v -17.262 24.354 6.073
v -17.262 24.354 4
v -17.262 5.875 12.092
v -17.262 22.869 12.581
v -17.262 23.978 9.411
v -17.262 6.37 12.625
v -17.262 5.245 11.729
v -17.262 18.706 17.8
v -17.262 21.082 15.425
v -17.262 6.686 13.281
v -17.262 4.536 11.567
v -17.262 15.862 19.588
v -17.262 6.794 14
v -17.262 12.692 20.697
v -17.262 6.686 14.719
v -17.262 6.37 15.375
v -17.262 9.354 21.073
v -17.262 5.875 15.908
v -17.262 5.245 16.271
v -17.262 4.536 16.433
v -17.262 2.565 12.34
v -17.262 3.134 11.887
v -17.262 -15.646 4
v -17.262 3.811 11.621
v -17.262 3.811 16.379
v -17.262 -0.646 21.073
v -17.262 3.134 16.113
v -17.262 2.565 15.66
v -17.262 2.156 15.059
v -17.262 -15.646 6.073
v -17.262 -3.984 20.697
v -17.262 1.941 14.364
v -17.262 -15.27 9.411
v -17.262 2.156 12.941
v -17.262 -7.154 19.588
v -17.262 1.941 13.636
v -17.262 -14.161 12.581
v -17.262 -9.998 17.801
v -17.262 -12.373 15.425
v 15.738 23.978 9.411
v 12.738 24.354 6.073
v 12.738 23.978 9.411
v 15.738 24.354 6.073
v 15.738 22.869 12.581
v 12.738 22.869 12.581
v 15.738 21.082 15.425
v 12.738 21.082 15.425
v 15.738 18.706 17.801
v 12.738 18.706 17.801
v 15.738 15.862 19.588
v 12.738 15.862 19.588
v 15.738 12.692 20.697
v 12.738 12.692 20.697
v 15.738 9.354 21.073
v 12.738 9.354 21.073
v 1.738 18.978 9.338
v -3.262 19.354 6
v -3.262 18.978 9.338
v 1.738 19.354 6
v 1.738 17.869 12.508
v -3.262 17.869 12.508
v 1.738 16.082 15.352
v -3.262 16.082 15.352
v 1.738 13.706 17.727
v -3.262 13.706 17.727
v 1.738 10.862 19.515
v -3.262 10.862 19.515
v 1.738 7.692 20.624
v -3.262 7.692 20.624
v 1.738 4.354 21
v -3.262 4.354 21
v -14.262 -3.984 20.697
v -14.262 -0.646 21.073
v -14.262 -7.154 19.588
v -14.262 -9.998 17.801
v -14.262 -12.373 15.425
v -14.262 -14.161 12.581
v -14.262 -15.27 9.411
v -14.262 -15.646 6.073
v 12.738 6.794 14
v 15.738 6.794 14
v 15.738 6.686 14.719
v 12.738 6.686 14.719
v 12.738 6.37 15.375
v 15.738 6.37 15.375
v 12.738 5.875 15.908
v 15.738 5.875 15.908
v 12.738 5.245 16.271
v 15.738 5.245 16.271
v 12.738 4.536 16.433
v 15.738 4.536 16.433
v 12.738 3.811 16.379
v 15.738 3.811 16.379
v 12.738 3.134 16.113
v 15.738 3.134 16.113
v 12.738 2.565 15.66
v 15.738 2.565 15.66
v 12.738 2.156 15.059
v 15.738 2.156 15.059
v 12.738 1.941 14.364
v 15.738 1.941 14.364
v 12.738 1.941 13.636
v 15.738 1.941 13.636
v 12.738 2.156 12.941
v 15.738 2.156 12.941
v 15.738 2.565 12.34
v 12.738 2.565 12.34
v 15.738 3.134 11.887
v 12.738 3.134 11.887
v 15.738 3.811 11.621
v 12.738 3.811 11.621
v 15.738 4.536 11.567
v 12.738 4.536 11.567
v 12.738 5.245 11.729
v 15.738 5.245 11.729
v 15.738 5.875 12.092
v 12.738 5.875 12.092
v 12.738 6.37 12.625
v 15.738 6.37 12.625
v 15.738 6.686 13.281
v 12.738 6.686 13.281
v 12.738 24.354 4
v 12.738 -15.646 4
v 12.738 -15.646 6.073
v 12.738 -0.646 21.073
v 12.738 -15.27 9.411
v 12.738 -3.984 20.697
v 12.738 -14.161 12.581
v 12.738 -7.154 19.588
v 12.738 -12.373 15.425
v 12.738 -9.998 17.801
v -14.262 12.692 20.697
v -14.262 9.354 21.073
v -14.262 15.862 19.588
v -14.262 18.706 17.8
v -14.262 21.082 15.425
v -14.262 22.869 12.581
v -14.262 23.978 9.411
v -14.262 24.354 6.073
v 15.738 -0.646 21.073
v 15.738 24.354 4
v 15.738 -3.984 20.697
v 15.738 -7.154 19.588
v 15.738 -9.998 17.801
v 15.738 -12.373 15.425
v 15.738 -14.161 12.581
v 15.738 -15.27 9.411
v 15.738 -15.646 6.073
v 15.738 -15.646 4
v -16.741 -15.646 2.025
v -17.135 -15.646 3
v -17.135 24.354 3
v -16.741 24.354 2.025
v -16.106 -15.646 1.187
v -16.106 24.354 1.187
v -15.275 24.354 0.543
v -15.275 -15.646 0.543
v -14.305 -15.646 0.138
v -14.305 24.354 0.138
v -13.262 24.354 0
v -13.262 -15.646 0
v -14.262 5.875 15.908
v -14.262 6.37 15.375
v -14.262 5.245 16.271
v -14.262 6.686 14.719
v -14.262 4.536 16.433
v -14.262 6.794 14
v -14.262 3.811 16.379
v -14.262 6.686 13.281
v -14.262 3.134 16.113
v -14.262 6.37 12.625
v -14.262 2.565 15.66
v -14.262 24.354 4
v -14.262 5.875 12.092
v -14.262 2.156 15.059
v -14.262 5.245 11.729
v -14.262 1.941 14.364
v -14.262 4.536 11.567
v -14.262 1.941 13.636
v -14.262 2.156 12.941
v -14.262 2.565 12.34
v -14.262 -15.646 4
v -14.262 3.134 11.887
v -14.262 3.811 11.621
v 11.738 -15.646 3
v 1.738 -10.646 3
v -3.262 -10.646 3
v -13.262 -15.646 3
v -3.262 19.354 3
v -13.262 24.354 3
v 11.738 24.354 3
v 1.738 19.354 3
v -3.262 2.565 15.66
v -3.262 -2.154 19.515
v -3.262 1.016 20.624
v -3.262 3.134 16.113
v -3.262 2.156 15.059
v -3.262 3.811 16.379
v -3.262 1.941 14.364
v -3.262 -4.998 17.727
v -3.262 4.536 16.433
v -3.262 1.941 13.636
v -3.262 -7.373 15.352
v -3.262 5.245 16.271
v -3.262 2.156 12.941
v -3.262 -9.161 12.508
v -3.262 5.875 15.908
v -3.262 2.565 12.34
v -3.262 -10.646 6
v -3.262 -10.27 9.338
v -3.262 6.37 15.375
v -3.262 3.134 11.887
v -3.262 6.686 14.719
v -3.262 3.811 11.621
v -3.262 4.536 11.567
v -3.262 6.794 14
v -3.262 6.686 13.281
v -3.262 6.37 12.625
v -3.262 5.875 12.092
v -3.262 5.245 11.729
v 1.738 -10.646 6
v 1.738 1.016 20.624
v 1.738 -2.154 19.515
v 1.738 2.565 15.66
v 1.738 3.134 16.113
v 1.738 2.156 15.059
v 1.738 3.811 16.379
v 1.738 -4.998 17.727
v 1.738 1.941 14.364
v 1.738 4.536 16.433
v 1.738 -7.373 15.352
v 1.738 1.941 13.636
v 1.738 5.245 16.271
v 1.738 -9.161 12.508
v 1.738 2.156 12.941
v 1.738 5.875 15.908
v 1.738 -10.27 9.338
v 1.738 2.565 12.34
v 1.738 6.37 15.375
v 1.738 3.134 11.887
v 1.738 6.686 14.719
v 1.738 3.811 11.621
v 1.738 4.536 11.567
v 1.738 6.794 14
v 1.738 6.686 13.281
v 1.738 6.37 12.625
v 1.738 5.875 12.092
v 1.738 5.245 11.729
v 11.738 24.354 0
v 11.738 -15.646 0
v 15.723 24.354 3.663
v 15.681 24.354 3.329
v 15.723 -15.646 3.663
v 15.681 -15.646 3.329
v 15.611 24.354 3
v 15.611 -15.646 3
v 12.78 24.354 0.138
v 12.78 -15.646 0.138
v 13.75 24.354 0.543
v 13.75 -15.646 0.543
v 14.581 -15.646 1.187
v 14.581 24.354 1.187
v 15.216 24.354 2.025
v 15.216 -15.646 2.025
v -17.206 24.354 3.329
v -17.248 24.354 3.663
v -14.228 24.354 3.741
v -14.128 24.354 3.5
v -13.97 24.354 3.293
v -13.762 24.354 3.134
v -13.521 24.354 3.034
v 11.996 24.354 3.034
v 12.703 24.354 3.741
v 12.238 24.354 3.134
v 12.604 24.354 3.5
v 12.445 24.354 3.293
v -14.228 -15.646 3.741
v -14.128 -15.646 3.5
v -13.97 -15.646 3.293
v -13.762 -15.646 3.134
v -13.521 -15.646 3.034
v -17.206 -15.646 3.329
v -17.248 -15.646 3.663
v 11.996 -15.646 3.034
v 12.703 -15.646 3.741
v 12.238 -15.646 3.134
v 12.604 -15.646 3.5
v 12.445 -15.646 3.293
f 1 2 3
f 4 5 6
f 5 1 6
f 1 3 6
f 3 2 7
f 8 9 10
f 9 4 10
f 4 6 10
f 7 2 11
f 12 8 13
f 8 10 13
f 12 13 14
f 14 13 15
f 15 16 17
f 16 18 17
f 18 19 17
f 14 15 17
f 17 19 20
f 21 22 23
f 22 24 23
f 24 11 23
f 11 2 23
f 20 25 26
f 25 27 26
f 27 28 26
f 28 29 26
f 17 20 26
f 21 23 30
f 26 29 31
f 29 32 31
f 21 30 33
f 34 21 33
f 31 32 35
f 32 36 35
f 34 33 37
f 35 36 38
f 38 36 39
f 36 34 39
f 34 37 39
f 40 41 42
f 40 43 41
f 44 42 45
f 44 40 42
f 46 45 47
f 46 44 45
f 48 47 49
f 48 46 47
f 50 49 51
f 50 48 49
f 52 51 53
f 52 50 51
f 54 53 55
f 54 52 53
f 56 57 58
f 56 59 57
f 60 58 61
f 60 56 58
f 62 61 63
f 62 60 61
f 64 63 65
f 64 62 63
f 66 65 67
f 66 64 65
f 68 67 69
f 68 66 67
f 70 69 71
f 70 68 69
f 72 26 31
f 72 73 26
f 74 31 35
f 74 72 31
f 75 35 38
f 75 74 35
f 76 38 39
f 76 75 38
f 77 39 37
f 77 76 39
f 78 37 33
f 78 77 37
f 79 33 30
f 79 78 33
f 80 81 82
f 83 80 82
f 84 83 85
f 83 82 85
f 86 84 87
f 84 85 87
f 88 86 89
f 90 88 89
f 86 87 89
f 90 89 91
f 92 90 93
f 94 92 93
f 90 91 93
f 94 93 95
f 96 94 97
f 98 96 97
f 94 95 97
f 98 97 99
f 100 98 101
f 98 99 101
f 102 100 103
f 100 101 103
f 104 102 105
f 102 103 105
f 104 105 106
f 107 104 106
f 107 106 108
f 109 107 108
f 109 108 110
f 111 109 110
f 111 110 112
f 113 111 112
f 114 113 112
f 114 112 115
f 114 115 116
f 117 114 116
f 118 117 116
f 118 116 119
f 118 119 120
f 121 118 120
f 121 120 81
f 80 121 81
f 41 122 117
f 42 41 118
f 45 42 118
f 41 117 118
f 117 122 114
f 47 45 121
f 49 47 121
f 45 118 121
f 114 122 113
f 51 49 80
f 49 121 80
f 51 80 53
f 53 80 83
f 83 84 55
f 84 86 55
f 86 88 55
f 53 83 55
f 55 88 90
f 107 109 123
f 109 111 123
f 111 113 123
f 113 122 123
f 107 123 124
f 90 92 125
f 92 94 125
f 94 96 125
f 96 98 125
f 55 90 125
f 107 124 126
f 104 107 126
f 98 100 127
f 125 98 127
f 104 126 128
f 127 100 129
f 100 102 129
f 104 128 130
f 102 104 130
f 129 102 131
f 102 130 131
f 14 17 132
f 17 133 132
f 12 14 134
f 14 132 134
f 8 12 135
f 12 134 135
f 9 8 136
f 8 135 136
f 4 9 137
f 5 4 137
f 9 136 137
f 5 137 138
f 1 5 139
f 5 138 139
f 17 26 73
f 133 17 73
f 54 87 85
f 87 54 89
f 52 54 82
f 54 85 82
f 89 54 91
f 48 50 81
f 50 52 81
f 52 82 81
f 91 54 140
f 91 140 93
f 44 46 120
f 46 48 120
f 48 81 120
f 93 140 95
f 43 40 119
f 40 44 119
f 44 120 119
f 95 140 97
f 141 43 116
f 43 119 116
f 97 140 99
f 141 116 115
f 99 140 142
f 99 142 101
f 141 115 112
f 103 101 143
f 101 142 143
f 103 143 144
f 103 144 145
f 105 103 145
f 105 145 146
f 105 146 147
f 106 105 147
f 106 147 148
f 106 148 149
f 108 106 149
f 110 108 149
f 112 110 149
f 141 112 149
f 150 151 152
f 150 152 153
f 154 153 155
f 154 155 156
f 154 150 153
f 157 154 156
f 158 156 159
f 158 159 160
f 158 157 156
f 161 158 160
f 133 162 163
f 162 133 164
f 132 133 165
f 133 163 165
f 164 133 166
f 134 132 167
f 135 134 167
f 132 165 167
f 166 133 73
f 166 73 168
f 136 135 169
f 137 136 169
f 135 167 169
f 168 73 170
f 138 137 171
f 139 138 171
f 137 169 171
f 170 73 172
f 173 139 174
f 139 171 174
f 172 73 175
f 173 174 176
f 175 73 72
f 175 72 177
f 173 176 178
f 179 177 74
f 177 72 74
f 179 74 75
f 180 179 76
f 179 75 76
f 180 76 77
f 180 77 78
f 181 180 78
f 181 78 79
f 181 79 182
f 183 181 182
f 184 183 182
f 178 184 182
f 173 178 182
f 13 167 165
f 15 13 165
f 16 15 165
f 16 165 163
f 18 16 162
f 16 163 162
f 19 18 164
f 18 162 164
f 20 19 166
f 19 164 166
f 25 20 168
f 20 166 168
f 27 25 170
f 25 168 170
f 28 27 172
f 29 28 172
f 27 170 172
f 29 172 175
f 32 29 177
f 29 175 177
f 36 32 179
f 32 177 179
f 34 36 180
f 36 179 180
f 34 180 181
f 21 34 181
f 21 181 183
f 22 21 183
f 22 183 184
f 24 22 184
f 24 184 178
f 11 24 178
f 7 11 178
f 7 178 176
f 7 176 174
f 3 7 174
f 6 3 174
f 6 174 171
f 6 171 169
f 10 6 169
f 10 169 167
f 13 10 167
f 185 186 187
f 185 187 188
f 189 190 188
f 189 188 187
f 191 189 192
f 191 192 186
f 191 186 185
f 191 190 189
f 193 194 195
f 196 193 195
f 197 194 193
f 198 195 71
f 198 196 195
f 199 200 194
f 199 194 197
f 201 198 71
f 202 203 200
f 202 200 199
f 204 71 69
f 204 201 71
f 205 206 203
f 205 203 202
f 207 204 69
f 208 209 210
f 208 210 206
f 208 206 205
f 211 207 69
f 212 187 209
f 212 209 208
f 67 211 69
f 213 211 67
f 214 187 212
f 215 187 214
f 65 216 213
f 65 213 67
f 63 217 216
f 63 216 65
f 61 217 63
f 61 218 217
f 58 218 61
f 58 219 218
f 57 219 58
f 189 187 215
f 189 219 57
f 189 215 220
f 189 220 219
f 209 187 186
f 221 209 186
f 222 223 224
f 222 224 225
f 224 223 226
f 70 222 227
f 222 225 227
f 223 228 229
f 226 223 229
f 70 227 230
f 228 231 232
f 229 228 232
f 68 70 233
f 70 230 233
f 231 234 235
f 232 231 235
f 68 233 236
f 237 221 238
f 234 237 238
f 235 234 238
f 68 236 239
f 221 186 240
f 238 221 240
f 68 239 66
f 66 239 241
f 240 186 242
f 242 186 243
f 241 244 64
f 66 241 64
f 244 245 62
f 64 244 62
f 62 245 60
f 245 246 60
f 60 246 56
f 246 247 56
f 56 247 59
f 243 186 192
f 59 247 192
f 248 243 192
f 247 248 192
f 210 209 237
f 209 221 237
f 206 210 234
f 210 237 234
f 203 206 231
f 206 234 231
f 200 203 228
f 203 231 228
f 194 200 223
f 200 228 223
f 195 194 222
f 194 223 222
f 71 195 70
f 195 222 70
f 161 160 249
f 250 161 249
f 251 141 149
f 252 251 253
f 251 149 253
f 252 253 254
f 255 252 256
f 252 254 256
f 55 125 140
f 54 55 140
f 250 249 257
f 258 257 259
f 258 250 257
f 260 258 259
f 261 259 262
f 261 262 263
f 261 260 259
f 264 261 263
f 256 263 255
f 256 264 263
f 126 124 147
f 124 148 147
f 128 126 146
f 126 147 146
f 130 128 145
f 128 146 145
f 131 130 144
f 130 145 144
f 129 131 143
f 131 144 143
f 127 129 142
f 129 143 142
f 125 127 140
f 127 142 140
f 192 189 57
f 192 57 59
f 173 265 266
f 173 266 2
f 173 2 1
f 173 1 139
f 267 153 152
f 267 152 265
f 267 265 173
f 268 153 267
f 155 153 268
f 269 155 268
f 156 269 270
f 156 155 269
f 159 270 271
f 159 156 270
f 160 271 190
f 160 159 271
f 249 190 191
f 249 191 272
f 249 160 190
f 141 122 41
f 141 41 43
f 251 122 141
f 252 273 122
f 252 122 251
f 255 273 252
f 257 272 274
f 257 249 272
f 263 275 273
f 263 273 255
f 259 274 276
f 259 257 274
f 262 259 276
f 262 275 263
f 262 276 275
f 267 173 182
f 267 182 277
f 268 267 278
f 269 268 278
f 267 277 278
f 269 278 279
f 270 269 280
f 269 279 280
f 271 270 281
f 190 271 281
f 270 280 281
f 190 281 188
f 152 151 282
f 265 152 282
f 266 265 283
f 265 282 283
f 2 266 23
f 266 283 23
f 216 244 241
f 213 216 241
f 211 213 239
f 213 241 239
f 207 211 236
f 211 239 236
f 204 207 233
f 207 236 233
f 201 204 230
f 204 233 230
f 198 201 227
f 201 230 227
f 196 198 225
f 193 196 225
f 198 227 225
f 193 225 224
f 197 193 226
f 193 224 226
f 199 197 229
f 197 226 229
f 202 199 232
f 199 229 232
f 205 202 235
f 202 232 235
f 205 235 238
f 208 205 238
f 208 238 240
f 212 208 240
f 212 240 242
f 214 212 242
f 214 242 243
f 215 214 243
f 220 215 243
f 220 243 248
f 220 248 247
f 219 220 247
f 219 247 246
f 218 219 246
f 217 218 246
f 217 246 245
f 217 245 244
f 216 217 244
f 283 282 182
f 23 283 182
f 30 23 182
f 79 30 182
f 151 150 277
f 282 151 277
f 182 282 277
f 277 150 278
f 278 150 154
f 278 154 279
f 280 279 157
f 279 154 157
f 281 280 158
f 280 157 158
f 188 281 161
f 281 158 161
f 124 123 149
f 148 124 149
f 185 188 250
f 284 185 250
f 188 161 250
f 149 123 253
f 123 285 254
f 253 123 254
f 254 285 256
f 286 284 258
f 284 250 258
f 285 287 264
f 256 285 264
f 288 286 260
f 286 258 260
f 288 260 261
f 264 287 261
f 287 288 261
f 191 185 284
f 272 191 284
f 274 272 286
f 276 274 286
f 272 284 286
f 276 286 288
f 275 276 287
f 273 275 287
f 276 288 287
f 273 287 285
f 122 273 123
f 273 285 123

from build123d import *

# Parameters (mm, degrees)
SKETCH_2_W          = 67
SKETCH_2_H          = 40
EXTRUDE_1_DEPTH     = 3
OTHER_START         = -15.645963378
OTHER_1_DEPTH       = 40
OTHER_1_2_DEPTH     = 40
SKETCH_8_W          = 5
SKETCH_8_H          = 30
EXTRUDE_2_DEPTH     = 18
FILLET_2_R          = 15
FILLET_3_R          = 15
SKETCH_9_R          = 2.44
CUT_EXTRUDE_1_DEPTH = 43


# Read off the part's stored shape, not the designer's step: 绘制的折弯1
with BuildPart() as part:
    # Sketch 2 → 凸台-拉伸1 (new body)
    with BuildSketch(Plane.XY):
        with Locations((-0.762466526, 4.354036622)):
            Rectangle(SKETCH_2_W, SKETCH_2_H)
    extrude(amount=EXTRUDE_1_DEPTH)

    # Other 1 outline → Other 1 (cut)
    with BuildSketch(Plane(origin=(0, 0, 0), x_dir=(1, 0, 0), z_dir=(0, 1, 0)).offset(OTHER_START)):
        with BuildLine():
            Line((-34.262466526, -3), (-17.135449872, -3))
            ThreePointArc((-17.135449872, -3), (-15.711956269, -0.83772234), (-13.262466526, 0))
            Line((-13.262466526, 0), (-34.262466526, 0))
            Line((-34.262466526, 0), (-34.262466526, -3))
        make_face()
        with BuildLine():
            ThreePointArc((11.737533474, 0), (14.187023217, -0.83772234), (15.61051682, -3))
            Line((15.61051682, -3), (32.737533474, -3))
            Line((32.737533474, -3), (32.737533474, 0))
            Line((32.737533474, 0), (11.737533474, 0))
        make_face()
    extrude(amount=OTHER_1_DEPTH, mode=Mode.SUBTRACT)

    # Other 1 2 outline → Other 1 2 (add)
    with BuildSketch(Plane(origin=(0, 0, 0), x_dir=(1, 0, 0), z_dir=(0, 1, 0)).offset(OTHER_START)):
        with BuildLine():
            Line((-14.262466526, -21.073009183), (-14.262466526, -4))
            ThreePointArc((-14.262466526, -4), (-13.969573307, -3.292893219), (-13.262466526, -3))
            Line((-13.262466526, -3), (-17.135449872, -3))
            ThreePointArc((-17.135449872, -3), (-17.230585311, -3.49598283), (-17.262466526, -4))
            Line((-17.262466526, -4), (-17.262466526, -21.073009183))
            Line((-17.262466526, -21.073009183), (-14.262466526, -21.073009183))
        make_face()
        with BuildLine():
            Line((15.61051682, -3), (11.737533474, -3))
            ThreePointArc((11.737533474, -3), (12.444640255, -3.292893219), (12.737533474, -4))
            Line((12.737533474, -4), (12.737533474, -21.073009183))
            Line((12.737533474, -21.073009183), (15.737533474, -21.073009183))
            Line((15.737533474, -21.073009183), (15.737533474, -4))
            ThreePointArc((15.737533474, -4), (15.705652259, -3.49598283), (15.61051682, -3))
        make_face()
    extrude(amount=OTHER_1_2_DEPTH)

    # 草图8 → 凸台-拉伸2 (add)
    with BuildSketch(Plane.XY.offset(3)):
        with Locations((-0.762466526, 4.354036622)):
            Rectangle(SKETCH_8_W, SKETCH_8_H)
    extrude(amount=EXTRUDE_2_DEPTH)

    # 圆角2
    fillet_2_edges = [part.edges().sort_by_distance(p)[0] for p in [
        (-15.762466526, 24.354036622, 21.073009183),
    ]]
    fillet(fillet_2_edges, radius=FILLET_2_R)

    # 圆角3
    fillet_3_edges = [part.edges().sort_by_distance(p)[0] for p in [
        (14.237533474, -15.645963378, 21.073009183),
        (14.237533474, 24.354036622, 21.073009183),
        (-0.762466526, 19.354036622, 21),
        (-0.762466526, -10.645963378, 21),
        (-15.762466526, -15.645963378, 21.073009183),
    ]]
    fillet(fillet_3_edges, radius=FILLET_3_R - 0.0001)  # a hair under: the kernel refuses the full size

    # 草图9 → 切除-拉伸1 (cut)
    with BuildSketch(Plane(origin=(15.737533474, 0, 0), x_dir=(0, 0, -1), z_dir=(1, 0, 0))):
        with Locations(Location((-14, 4.354036622, 0), (0, 0, 90))):
            Circle(SKETCH_9_R)
    extrude(amount=-CUT_EXTRUDE_1_DEPTH, mode=Mode.SUBTRACT)


solid = part.part
